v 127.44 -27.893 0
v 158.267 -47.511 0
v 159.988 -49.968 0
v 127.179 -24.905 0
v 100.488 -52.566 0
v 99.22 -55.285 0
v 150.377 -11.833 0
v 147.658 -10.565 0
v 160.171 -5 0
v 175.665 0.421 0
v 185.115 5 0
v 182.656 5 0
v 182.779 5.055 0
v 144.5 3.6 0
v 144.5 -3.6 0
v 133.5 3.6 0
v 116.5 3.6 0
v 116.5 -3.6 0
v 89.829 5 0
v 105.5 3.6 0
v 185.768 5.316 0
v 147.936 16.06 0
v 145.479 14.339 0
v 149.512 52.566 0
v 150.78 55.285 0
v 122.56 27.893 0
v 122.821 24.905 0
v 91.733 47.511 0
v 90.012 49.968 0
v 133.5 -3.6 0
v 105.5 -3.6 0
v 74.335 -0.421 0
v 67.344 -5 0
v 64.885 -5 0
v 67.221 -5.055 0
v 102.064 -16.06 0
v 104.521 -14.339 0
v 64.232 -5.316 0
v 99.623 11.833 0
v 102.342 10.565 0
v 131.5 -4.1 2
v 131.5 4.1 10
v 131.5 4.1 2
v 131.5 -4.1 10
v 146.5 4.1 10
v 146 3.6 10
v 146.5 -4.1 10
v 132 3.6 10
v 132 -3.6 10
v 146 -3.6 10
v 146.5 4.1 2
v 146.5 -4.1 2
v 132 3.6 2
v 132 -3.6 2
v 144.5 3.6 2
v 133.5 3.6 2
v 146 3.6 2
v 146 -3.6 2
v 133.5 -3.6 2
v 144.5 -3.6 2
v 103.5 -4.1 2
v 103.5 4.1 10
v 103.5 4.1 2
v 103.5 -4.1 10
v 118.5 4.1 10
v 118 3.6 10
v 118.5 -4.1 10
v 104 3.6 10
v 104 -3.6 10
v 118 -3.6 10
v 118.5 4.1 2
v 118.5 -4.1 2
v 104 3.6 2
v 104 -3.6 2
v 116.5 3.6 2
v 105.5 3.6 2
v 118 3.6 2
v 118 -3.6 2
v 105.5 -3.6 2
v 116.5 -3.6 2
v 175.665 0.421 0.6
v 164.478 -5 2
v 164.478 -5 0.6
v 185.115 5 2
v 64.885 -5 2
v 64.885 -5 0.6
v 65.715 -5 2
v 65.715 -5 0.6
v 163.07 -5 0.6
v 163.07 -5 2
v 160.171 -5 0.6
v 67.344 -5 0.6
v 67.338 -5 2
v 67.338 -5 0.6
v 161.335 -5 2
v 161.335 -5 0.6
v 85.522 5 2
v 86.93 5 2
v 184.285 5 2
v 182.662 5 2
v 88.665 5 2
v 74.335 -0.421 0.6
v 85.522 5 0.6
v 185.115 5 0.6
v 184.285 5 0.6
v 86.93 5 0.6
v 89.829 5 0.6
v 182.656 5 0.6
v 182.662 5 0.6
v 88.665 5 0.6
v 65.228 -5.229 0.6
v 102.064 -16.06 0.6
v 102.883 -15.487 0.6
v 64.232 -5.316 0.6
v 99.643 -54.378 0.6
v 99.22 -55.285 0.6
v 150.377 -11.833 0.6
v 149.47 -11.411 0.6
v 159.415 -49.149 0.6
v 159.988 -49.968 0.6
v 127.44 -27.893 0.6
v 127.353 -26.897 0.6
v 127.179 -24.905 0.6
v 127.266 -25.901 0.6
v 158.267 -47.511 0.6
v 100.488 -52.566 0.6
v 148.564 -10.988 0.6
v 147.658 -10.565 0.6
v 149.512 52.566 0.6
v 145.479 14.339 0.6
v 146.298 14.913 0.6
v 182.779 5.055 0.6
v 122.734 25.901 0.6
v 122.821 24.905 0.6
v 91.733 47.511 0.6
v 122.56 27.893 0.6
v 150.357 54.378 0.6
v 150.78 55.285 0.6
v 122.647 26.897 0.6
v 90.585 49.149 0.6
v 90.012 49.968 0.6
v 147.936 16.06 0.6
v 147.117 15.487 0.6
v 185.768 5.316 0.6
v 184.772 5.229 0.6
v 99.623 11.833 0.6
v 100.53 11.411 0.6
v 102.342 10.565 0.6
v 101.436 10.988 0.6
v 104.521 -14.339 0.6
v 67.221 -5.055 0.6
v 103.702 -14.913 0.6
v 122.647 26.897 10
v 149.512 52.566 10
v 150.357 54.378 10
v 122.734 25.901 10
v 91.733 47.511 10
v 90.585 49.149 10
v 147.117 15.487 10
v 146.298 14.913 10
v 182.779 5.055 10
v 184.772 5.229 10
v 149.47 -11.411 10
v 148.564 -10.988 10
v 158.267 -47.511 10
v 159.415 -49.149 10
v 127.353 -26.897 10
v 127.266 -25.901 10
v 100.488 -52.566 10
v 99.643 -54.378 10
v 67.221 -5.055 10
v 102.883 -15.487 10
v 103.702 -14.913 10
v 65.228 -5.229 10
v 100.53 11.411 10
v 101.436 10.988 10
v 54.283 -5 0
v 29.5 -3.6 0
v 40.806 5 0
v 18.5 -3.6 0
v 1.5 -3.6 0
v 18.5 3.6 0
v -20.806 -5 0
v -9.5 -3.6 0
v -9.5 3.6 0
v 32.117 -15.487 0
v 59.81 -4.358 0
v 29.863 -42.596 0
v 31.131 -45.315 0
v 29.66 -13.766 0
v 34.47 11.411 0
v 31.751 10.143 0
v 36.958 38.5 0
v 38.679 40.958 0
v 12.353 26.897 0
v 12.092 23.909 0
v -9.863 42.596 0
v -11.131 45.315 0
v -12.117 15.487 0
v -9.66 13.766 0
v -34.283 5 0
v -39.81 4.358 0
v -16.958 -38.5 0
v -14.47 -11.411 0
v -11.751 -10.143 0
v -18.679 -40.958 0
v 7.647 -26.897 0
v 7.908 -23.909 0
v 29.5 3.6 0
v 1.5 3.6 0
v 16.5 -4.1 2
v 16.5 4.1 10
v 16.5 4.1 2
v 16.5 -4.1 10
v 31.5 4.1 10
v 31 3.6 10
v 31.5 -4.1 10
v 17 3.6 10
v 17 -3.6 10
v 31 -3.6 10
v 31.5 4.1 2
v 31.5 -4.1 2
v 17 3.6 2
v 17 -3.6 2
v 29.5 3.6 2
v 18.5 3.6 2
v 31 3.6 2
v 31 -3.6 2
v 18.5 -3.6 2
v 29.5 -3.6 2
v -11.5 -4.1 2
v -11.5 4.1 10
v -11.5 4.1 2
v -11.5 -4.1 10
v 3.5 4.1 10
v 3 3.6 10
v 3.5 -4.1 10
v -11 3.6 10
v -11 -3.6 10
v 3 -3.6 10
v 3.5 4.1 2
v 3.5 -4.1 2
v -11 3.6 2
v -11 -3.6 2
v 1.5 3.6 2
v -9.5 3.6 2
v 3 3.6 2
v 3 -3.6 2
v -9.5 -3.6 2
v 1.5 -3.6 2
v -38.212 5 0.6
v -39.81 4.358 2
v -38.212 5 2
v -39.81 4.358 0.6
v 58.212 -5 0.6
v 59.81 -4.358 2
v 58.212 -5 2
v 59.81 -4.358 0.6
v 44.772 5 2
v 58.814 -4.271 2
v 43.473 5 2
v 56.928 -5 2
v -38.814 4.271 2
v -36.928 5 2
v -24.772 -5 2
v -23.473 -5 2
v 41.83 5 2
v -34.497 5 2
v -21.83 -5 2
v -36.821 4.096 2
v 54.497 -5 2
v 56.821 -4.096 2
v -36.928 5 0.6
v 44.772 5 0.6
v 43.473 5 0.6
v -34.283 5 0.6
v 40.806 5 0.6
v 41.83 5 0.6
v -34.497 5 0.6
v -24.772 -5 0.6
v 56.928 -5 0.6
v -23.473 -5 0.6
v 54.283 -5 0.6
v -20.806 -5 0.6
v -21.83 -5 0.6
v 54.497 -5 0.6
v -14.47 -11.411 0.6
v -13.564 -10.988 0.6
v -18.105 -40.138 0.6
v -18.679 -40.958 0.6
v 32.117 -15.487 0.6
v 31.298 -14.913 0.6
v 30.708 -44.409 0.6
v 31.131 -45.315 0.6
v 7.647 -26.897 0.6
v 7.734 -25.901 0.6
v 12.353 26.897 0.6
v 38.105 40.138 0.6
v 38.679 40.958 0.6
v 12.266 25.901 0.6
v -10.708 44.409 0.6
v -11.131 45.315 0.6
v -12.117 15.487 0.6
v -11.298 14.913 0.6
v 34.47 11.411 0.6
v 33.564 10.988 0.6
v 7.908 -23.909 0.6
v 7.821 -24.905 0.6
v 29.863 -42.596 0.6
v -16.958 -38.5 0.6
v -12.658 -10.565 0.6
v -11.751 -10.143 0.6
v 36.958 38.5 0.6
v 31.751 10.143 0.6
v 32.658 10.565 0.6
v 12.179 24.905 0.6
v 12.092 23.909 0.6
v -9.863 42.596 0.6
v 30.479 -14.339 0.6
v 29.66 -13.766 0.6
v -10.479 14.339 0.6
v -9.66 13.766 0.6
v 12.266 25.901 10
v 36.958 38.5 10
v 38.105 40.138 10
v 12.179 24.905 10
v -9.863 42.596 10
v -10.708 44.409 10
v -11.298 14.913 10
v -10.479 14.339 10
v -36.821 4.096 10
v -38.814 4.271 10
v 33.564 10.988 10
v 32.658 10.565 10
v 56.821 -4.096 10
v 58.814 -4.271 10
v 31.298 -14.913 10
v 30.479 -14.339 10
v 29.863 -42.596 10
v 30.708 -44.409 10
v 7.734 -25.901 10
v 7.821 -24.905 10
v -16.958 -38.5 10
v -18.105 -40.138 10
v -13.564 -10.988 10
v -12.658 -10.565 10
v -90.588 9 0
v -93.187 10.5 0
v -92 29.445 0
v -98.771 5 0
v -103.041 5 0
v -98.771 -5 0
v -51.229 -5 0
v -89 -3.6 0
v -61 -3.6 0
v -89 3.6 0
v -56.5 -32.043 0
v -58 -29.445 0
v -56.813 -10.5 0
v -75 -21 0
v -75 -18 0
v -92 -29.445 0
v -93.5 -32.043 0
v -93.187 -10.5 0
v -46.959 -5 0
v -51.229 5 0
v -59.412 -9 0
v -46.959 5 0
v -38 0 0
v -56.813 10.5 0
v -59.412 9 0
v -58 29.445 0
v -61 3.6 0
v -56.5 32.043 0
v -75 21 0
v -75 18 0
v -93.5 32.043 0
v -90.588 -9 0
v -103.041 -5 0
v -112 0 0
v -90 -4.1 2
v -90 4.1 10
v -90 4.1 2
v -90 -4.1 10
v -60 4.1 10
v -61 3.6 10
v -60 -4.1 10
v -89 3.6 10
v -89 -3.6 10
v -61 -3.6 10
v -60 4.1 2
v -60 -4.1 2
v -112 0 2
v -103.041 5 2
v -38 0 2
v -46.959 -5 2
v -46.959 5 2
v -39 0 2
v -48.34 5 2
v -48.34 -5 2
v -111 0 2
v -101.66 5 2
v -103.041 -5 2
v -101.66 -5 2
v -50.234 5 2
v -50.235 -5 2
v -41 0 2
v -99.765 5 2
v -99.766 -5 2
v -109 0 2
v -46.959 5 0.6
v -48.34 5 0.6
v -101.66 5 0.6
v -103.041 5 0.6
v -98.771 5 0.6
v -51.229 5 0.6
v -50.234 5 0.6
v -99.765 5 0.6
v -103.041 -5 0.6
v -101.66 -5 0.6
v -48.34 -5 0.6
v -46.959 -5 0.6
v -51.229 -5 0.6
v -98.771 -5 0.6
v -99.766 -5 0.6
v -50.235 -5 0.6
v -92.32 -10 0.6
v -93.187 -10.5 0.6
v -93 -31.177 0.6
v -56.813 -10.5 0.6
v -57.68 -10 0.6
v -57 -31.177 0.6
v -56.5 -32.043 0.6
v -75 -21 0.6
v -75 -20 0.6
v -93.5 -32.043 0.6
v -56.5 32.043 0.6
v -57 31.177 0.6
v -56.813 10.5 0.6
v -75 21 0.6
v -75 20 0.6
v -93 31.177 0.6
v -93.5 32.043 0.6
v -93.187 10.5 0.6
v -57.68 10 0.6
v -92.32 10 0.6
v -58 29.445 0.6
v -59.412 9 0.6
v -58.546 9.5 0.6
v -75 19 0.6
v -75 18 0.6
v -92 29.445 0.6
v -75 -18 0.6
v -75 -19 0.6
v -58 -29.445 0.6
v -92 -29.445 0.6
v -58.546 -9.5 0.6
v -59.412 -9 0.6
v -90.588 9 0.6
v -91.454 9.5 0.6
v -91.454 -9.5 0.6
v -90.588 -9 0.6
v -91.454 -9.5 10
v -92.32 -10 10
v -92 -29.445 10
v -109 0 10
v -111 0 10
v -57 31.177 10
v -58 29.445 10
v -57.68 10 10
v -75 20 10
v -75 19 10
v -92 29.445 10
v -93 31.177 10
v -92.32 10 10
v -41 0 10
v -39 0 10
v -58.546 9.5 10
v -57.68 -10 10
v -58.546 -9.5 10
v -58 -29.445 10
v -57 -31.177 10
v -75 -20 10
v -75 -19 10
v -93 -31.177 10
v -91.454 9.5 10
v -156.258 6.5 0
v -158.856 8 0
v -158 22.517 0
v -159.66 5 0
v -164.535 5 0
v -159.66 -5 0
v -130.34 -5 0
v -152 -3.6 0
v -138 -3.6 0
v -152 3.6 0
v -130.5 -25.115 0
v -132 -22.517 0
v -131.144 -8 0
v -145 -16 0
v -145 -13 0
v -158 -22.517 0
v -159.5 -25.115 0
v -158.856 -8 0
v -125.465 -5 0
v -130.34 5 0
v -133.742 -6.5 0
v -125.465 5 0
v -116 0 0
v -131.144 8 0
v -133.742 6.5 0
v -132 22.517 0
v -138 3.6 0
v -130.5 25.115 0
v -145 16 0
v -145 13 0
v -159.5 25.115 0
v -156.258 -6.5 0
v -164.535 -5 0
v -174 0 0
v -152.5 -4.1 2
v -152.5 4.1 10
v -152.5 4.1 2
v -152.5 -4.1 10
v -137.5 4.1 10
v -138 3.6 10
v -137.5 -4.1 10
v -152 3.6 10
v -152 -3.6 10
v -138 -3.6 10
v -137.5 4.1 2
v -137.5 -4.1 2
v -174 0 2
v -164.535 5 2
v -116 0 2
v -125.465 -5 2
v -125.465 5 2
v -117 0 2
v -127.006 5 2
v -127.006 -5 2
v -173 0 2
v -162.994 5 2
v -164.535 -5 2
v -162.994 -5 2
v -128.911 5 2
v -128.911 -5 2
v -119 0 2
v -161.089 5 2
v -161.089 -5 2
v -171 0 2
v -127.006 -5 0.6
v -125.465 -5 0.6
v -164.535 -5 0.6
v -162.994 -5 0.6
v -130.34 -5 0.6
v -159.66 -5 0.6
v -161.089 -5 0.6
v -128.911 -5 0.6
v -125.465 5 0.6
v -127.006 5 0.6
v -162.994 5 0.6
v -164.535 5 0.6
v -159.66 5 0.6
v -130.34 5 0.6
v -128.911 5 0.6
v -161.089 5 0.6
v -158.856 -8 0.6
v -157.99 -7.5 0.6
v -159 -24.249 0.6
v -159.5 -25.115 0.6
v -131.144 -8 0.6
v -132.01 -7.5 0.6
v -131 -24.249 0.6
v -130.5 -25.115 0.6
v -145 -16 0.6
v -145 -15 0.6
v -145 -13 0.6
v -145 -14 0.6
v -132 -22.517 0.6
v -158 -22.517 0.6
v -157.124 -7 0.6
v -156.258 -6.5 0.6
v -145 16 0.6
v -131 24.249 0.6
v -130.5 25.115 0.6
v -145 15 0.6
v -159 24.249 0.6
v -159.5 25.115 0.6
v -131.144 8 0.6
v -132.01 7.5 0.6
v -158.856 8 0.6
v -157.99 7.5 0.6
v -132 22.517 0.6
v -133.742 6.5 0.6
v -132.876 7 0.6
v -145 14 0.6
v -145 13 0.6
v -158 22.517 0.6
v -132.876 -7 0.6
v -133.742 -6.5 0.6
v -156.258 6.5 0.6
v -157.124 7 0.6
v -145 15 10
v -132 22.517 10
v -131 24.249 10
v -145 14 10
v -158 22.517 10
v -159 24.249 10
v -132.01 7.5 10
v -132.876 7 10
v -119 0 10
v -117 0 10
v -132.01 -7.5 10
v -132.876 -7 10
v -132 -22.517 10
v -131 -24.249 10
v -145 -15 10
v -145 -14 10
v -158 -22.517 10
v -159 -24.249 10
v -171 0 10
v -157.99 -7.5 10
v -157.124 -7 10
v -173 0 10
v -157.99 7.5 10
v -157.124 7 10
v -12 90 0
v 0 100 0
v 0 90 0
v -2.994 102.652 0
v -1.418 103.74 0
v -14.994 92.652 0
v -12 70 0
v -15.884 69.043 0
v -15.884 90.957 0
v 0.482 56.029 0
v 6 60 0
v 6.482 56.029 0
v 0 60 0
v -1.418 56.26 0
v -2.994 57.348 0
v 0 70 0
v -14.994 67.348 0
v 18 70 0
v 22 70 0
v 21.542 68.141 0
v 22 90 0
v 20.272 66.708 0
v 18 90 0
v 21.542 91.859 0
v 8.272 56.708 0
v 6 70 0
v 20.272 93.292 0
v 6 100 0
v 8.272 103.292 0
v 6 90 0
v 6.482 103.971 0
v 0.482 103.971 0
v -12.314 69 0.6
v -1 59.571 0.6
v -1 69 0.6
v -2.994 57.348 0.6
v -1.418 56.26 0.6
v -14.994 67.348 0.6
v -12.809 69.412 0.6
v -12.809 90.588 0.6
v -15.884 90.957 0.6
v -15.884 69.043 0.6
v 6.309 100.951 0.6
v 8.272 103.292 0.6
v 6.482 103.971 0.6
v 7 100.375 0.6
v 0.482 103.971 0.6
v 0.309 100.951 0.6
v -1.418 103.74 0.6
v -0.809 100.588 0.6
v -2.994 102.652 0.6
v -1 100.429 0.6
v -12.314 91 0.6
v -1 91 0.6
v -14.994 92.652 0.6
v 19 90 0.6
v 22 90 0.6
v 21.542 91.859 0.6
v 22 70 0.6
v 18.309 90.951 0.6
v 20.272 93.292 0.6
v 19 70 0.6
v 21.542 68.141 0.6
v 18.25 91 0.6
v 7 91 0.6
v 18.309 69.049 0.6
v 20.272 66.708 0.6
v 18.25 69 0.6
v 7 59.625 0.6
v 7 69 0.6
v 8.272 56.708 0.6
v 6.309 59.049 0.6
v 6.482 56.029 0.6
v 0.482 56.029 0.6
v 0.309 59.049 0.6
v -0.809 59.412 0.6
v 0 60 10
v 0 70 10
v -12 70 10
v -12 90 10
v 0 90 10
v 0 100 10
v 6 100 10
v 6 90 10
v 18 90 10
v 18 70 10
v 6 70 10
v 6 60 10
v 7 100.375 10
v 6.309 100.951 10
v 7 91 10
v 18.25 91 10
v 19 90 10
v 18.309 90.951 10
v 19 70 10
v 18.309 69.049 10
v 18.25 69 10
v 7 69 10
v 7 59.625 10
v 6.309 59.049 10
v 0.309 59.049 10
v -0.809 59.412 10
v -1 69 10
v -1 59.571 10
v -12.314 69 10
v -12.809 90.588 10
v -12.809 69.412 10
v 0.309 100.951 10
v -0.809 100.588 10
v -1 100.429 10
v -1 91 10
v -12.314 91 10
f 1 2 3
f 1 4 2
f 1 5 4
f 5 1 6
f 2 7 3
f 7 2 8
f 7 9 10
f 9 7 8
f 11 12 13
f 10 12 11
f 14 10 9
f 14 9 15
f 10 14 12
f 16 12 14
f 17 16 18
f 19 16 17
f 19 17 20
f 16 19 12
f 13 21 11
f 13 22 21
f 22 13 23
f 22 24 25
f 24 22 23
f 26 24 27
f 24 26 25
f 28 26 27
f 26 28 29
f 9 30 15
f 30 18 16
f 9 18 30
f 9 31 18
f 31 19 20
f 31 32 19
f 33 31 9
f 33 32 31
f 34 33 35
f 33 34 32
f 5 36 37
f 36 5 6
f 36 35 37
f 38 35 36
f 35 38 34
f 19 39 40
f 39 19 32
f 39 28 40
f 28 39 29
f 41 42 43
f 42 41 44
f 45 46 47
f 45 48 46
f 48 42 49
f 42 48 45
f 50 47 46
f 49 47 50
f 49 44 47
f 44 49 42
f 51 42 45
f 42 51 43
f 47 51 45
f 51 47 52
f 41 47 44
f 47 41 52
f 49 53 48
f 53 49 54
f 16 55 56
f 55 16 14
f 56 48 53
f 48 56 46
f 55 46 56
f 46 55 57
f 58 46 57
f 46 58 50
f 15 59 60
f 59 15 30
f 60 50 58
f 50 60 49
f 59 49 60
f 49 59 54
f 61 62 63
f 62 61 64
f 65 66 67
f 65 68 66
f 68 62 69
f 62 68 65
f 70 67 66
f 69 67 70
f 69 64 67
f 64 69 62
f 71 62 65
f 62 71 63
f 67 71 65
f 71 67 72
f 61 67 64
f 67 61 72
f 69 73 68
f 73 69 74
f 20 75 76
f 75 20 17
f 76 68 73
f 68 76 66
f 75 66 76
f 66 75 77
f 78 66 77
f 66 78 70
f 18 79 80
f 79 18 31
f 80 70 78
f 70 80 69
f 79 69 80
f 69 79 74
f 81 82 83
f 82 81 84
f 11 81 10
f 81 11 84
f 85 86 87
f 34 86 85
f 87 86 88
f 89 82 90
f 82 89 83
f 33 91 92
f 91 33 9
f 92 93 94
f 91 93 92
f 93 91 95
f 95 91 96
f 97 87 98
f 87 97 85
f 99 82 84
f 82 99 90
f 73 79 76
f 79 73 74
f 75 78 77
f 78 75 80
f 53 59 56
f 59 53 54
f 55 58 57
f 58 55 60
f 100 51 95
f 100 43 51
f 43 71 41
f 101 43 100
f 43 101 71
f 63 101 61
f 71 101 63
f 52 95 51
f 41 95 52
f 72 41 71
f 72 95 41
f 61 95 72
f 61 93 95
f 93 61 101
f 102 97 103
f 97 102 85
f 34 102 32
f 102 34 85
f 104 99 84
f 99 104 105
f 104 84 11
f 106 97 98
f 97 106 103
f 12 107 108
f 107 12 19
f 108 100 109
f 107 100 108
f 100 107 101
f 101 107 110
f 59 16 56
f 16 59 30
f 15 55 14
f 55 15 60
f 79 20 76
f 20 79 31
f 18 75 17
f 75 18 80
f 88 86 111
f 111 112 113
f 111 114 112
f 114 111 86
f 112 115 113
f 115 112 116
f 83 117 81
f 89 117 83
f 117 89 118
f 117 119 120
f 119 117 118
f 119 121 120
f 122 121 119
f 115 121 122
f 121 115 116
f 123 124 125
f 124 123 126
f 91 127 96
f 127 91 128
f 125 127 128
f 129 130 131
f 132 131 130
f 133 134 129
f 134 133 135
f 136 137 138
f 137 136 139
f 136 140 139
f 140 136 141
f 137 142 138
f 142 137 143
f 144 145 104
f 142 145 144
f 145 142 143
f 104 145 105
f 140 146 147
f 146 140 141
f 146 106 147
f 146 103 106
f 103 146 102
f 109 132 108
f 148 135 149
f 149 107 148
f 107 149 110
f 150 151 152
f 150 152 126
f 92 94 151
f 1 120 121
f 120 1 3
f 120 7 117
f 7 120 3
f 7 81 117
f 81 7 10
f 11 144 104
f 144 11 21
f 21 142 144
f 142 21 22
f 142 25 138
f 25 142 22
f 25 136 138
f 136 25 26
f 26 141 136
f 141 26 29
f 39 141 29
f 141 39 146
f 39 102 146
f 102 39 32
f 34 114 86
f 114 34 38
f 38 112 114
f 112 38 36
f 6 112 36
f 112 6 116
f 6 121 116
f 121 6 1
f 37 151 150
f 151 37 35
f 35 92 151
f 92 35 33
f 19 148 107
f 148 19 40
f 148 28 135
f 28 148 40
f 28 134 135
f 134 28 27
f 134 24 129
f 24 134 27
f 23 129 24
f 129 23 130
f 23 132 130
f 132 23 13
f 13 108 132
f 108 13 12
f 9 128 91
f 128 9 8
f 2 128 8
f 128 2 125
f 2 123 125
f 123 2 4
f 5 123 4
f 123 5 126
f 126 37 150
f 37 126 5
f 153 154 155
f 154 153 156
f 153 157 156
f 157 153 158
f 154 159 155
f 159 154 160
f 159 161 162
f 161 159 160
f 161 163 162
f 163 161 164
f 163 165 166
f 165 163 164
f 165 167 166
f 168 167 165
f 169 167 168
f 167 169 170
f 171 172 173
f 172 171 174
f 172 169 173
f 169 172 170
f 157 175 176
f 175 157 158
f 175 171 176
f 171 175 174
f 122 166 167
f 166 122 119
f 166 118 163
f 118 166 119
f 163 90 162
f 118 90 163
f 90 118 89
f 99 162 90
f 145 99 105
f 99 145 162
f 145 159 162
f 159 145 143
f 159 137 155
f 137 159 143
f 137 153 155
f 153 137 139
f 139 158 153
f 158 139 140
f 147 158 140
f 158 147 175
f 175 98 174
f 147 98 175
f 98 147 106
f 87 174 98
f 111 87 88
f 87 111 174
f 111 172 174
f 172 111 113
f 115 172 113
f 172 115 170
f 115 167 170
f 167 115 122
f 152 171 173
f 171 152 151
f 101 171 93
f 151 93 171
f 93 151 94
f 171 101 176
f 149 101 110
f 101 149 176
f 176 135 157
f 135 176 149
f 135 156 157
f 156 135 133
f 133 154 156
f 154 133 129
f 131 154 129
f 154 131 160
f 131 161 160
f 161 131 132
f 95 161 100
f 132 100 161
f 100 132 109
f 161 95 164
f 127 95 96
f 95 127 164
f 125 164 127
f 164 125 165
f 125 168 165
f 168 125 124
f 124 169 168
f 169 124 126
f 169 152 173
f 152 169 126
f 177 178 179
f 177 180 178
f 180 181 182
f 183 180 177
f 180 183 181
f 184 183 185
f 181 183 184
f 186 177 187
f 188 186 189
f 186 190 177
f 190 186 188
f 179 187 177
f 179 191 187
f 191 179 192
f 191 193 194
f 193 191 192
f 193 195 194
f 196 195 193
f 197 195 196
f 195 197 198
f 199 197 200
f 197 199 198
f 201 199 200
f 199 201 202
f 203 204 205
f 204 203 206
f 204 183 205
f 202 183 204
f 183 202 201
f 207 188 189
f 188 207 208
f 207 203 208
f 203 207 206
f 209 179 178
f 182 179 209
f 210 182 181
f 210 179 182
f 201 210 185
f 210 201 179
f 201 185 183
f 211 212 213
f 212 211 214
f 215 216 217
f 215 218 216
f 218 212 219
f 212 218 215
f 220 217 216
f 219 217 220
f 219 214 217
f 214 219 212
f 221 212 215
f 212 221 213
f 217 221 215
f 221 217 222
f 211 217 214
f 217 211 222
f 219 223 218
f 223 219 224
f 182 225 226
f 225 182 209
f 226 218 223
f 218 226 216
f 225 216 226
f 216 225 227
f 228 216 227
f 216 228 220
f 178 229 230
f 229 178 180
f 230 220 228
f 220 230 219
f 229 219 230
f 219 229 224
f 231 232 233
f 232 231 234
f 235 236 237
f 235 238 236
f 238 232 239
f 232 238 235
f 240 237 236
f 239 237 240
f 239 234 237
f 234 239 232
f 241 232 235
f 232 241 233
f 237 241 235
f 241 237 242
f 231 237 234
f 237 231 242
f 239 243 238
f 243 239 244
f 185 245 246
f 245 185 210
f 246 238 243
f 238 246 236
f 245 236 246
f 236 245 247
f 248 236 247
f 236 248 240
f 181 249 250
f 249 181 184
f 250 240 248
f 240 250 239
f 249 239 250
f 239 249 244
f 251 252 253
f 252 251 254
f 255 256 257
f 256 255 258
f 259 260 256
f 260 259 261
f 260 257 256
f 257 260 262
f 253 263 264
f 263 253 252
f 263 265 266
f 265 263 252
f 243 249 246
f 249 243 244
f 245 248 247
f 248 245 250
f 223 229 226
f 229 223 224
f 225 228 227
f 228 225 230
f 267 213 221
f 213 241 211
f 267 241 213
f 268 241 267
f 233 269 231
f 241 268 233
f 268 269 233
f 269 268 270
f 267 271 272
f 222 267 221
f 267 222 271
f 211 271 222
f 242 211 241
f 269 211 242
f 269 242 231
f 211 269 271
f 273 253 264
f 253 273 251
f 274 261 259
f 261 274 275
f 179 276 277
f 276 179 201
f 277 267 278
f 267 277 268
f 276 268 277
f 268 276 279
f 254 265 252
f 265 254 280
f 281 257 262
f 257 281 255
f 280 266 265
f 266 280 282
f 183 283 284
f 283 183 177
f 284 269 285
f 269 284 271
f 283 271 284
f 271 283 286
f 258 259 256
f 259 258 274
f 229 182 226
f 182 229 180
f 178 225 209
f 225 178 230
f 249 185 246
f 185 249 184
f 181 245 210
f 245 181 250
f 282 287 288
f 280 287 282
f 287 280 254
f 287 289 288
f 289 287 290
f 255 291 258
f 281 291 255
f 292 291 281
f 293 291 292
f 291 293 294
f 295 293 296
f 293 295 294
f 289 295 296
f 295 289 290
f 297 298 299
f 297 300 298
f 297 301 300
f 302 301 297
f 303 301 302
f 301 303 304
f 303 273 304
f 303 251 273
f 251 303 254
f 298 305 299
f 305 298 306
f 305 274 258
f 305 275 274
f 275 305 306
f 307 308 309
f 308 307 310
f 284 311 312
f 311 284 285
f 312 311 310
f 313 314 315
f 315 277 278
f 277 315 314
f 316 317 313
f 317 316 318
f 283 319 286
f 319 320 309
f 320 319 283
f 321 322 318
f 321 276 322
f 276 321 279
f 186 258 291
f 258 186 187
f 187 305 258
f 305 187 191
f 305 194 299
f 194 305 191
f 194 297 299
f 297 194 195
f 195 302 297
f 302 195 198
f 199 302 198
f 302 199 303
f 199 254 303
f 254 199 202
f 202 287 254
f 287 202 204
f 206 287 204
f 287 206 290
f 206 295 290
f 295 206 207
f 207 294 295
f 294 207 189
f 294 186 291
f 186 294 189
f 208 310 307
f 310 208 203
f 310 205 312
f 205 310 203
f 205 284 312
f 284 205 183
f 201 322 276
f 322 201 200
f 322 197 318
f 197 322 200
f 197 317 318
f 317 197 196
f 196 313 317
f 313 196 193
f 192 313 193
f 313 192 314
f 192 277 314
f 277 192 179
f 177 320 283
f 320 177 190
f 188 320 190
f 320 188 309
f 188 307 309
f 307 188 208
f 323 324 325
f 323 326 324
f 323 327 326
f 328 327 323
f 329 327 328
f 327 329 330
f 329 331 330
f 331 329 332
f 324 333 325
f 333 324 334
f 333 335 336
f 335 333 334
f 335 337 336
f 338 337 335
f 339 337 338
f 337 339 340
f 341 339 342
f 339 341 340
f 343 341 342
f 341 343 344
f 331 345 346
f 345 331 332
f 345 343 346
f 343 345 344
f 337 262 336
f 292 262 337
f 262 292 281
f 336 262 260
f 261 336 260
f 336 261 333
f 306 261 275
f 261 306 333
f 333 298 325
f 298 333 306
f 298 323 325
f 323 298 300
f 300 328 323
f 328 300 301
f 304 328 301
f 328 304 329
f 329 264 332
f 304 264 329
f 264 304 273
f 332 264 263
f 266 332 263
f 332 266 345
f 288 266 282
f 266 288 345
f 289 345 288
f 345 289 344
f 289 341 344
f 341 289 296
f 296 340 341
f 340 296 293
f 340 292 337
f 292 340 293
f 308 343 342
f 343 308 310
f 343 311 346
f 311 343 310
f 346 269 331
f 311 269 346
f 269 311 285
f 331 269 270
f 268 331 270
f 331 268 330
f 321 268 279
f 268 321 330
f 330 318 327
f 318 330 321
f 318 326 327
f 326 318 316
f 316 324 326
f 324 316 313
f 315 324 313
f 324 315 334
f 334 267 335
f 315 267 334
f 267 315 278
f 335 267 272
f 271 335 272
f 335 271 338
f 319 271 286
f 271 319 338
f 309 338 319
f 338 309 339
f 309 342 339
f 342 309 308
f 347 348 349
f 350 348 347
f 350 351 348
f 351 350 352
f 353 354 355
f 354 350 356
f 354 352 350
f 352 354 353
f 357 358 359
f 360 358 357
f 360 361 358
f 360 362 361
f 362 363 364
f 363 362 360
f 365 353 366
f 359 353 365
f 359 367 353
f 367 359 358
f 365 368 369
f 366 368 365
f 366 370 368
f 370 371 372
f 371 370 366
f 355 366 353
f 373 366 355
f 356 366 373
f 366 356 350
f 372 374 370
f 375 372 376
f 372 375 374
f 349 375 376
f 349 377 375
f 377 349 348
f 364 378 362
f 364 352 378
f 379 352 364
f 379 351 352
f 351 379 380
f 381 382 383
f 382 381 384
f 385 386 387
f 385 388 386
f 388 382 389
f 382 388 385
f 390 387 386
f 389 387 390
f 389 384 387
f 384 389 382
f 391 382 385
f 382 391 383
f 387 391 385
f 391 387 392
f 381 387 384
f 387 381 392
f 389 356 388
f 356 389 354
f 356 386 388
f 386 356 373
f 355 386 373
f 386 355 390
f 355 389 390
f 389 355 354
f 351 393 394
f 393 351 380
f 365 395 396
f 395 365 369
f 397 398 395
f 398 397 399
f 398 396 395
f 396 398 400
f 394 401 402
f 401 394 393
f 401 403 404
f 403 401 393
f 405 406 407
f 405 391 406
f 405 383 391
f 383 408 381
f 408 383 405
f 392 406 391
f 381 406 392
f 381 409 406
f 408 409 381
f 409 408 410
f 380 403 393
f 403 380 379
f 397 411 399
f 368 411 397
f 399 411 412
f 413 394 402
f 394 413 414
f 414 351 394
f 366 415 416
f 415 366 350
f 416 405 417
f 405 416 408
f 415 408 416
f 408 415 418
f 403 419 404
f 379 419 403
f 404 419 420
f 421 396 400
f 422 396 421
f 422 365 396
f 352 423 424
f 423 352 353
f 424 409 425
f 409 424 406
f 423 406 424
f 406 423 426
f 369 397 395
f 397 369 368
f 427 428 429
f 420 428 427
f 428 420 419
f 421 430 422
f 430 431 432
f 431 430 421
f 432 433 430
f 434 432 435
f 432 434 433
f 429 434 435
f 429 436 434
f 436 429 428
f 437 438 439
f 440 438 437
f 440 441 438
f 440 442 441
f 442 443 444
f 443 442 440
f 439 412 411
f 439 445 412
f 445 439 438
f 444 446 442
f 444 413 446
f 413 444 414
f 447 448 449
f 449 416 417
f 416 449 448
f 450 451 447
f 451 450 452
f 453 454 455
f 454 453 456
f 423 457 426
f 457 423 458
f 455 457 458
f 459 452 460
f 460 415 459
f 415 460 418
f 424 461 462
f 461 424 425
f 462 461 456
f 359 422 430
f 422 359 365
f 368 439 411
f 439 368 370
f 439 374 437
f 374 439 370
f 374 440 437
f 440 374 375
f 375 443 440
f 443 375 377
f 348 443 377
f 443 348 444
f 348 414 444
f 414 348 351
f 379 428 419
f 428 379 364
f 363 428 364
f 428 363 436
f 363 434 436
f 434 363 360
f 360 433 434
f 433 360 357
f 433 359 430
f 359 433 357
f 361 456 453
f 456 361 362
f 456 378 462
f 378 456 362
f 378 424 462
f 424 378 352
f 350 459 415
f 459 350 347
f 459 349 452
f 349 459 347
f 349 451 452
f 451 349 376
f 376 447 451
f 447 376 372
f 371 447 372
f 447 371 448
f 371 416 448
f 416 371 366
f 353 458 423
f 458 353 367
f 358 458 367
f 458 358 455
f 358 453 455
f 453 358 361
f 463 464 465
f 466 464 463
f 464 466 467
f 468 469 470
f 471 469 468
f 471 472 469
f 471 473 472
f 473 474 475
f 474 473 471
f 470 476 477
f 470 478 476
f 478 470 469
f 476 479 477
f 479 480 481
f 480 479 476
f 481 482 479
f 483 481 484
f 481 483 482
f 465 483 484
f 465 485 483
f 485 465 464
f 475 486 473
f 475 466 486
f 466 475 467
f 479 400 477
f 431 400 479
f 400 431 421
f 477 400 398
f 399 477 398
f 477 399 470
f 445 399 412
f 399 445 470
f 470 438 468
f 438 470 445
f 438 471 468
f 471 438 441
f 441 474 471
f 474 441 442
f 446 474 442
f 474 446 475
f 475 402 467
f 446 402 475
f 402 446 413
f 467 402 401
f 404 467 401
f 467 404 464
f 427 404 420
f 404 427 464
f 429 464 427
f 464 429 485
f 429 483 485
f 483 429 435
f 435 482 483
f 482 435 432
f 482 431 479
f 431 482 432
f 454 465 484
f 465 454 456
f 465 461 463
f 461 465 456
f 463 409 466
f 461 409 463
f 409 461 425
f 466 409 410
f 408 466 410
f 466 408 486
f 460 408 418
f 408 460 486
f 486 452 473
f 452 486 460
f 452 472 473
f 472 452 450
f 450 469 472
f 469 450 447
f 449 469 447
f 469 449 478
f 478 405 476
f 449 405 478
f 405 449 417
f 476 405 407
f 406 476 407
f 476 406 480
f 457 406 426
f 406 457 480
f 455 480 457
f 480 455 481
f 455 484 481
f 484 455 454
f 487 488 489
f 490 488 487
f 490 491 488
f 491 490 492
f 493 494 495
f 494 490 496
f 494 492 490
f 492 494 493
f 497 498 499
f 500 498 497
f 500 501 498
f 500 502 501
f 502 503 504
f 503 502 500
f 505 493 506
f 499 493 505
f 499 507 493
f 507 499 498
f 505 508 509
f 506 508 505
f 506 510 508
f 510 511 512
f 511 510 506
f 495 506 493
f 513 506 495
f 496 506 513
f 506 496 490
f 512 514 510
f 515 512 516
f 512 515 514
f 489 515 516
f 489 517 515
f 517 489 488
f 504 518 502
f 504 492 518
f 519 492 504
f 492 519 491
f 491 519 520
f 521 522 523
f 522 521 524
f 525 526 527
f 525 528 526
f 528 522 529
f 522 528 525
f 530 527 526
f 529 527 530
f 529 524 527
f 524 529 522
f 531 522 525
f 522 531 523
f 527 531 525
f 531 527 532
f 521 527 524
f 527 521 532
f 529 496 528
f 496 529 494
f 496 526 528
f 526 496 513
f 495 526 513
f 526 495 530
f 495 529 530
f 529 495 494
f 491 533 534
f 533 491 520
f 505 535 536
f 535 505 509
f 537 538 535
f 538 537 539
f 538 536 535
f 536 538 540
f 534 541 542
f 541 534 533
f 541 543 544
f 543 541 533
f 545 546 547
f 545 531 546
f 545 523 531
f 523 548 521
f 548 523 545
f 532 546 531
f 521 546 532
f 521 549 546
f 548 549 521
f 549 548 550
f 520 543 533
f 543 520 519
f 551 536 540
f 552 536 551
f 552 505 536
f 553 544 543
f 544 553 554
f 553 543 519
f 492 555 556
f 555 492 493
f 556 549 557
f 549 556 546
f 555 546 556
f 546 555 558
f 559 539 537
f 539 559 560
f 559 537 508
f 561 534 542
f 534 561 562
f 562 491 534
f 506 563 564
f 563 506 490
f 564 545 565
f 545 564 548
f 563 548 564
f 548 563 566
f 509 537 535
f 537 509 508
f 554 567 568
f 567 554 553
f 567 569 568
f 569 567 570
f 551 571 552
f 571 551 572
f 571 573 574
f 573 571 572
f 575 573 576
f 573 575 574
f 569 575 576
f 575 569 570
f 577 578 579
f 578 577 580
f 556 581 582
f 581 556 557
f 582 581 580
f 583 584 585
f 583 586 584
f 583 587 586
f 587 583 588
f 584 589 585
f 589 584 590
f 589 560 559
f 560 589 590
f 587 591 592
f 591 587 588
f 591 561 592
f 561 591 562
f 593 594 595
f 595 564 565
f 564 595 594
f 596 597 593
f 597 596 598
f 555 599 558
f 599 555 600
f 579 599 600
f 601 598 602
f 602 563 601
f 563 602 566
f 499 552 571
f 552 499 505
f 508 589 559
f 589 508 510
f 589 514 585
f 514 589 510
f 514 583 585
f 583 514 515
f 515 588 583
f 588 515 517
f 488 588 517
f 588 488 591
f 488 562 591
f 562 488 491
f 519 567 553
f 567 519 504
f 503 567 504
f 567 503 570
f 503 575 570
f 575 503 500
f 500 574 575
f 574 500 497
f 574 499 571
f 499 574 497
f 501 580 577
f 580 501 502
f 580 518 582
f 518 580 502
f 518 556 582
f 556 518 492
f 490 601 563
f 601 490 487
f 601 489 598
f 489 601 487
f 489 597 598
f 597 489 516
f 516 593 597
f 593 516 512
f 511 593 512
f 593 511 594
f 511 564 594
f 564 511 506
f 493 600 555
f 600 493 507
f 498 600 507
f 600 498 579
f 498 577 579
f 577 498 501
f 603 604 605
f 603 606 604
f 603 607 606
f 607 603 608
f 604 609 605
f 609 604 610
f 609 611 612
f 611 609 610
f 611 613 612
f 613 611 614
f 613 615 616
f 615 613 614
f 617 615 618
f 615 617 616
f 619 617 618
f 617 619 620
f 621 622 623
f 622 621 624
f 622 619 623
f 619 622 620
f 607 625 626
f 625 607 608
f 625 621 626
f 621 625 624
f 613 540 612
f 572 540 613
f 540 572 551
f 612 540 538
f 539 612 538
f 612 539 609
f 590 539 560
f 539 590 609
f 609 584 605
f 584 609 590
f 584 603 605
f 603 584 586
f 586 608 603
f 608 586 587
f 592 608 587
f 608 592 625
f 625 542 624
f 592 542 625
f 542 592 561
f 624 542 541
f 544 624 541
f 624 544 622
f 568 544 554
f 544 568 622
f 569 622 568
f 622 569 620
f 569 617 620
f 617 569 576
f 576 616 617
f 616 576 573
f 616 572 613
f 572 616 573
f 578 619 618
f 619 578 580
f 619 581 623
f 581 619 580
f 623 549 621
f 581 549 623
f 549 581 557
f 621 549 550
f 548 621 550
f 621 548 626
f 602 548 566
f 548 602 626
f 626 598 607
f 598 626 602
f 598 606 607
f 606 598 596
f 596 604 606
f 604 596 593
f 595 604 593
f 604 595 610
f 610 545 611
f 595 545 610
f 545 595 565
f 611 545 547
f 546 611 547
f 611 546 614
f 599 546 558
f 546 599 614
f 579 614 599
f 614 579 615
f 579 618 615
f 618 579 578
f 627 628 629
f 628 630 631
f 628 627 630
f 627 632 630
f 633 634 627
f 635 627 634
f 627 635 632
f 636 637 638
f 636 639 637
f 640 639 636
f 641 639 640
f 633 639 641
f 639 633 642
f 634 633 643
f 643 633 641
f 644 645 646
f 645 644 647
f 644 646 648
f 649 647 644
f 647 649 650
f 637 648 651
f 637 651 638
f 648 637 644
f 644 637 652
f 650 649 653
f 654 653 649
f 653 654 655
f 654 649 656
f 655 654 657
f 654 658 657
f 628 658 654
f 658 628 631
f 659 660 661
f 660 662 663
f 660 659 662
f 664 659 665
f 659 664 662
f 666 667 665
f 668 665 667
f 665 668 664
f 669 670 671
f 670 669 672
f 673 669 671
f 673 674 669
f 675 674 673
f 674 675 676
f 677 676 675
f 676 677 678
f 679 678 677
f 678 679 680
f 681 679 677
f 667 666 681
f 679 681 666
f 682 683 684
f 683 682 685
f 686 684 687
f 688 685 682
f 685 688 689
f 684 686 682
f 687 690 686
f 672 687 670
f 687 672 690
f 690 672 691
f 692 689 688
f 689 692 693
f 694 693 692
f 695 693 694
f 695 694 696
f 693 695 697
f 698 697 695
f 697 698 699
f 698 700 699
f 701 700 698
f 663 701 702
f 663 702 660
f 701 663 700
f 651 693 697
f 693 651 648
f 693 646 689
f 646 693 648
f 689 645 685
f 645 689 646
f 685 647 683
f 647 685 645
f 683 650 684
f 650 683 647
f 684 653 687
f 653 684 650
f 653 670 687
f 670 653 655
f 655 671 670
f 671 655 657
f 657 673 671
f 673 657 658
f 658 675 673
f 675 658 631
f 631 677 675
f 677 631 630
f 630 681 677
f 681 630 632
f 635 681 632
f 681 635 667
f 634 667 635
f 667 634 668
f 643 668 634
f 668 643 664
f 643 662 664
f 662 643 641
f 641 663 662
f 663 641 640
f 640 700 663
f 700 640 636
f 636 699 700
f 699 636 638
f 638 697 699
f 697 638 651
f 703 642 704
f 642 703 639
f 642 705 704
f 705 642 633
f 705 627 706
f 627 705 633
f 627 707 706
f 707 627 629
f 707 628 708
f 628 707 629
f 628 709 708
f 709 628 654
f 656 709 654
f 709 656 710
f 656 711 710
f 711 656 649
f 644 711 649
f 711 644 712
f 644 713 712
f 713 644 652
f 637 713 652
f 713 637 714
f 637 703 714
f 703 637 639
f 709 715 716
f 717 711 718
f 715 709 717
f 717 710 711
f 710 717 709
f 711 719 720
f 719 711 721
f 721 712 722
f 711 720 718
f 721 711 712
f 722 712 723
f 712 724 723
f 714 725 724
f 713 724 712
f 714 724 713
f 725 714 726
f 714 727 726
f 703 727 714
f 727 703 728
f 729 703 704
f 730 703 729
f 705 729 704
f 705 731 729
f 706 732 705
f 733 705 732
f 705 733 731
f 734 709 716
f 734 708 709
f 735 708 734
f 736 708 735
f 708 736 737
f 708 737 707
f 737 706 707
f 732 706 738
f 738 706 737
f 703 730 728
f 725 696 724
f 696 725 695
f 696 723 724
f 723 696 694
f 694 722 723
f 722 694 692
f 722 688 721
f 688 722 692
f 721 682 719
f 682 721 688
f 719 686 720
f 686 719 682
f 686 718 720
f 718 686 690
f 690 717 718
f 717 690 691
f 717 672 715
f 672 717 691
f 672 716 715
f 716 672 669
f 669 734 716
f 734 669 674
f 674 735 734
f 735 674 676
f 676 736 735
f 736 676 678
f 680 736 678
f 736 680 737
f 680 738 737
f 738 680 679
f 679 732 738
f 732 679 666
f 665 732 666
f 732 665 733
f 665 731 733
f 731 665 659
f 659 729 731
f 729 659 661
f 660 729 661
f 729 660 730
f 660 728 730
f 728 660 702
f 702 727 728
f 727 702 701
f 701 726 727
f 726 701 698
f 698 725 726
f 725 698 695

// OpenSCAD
fn=6;


// create 2d vector shape: circle
function circv(r=1,fn=32)=
[for(i=[0:fn-1])
[r*cos(360*i/fn),r*sin(360*i/fn)]
];

// create 2d vector shape: star
function starv(r1=1,r2=2,fn=32)=
[for(i=[0:(2*fn-1)])
(i%2==0)?
[r1*cos(180*i/fn),r1*sin(180*i/fn)]:
[r2*cos(180*i/fn),r2*sin(180*i/fn)]
];


// display a 2d vector shape
module dispv(v){
indi=[[for(i=[0:len(v)-1])i]];
polygon(points=v,paths=indi);
}
ep=10;
// etoile(nbdepointe,dia intérieur,diaextérieur,epaisseur,angle,decalageentretoiseN-1,0si dernierétage
translate([125,0,0])etoile(6,27,60,ep,35,14,1);
translate([10,0,0])etoile(6,26,49,ep,25,14,1);
translate([-75,0,0])etoile(6,20,36,ep,30,7,2);
translate([-145,0,0])etoile(6,15,28,ep,30,7,0);
translate([ 0,60,000])entretoise(ep);

module entretoise(epais)
{
e=10; //epaisseur de pate
h=20; //ecart entre les plateaux
l=6; //largeur du tenon
a=12; //largeur des aillettes
cercle1=4;
linear_extrude(.6)
difference(){
    hull() {
        translate([0,0]) circle(cercle1);
        translate([0,e]) circle(cercle1);
        translate([-a,e]) circle(cercle1);
        translate([-a,e+h]) circle(cercle1);
        translate([0,e+h]) circle(cercle1);
        translate([0,e+h+e]) circle(cercle1);
        translate([l,e+h+e]) circle(cercle1);
        translate([l,e+h]) circle(cercle1);
        translate([l+a,e+h]) circle(cercle1);
        translate([l+a,e]) circle(cercle1);
        translate([l,e]) circle(cercle1);
        translate([l,0]) circle(cercle1);
    }
polygon([[0,0],[0,e],[-a,e],
    [-a,e+h],[0,e+h],[0,e+h+e],[l,e+h+e],[l,e+h],
    [l+a,e+h],[l+a,e],[l,e],[l,0]]);
}

cercle=1;
linear_extrude(epais)
difference(){
    hull() {
        translate([0,0]) circle(cercle);
        translate([0,e]) circle(cercle);
        translate([-a,e]) circle(cercle);
        translate([-a,e+h]) circle(cercle);
        translate([0,e+h]) circle(cercle);
        translate([0,e+h+e]) circle(cercle);
        translate([l,e+h+e]) circle(cercle);
        translate([l,e+h]) circle(cercle);
        translate([l+a,e+h]) circle(cercle);
        translate([l+a,e]) circle(cercle);
        translate([l,e]) circle(cercle);
        translate([l,0]) circle(cercle);
    }
polygon([[0,0],[0,e],[-a,e],
    [-a,e+h],[0,e+h],[0,e+h+e],[l,e+h+e],[l,e+h],
    [l+a,e+h],[l+a,e],[l,e],[l,0]]);
polygon([[-1,-1],   [-1,e-1],    [-a-1,e-1],[-a-1,-1]]);
polygon([[-1,e+h+1],[-1,e+h+e+1],[-a-1,e+h+e+1],[-a-1,e+h+1]]);
polygon([[l+1,-1],   [l+1,e-1],    [l+a+1,e-1],[l+a+1,-1]]);
polygon([[l+1,e+h+1],[l+1,e+h+e+1],[l+a+1,e+h+e+1],[l+a+1,e+h+1]]);
}

}


module etoile(nb,et1,et2,epais,ang,dec1,dec2)
{
//etoile et decoupe
et11=starv(et1,et2,nb);
et12=starv(et1-1,et2-2,nb);
et21=starv(et1+1,et2+1,nb);
et22=starv(et1-2,et2-2,nb);

linear_extrude(.6)
    difference(){
//v0=starv(et1+1,et2+1,nb);
rotate([0,0,ang])translate([00,0,0])dispv(et21);

//v0=starv(et1-2,et2-2,fn);
rotate([0,0,ang])translate([00,0,0])dispv(et22);
}

linear_extrude(epais)
    difference(){
//v0=starv(et1,et2,nb);
rotate([0,0,ang])translate([00,0,0])dispv(et11);

//v0=starv(et1-2,et2-2,fn);
rotate([0,0,ang])translate([00,0,0])dispv(et12);
}




if (dec2==1){
difference(){
linear_extrude(epais)translate([dec1,0,0])square([15,8.2],center=true);
linear_extrude(epais)translate([dec1,0,0])square([14,7.2],center=true);
}
difference(){
linear_extrude(epais)translate([-dec1,0,0])square([15,8.2],center=true);
linear_extrude(epais)translate([-dec1,0,0])square([14,7.2],center=true);
}
}

if (dec2==1){
difference(){
linear_extrude(2)difference(){
rotate([0,0,ang])translate([00,0,0])dispv(et21);
translate([0,200/2+5,0])square([200,200],center=true);
translate([0,-200/2-5,0])square([200,200],center=true);
}
linear_extrude(2)translate([dec1,0,0])square([11,8.2],center=true);
linear_extrude(2)translate([-dec1,0,0])square([11,8.2],center=true);
}
}

if (dec2==2){
difference(){
linear_extrude(epais)translate([0,0,0])square([15*2,8.2],center=true);
linear_extrude(epais)translate([0,0,0])square([14*2,7.2],center=true);
}
}

if (dec2==2){
difference(){
linear_extrude(2)difference(){
rotate([0,0,ang])translate([00,0,0])dispv(et21);
translate([0,200/2+5,0])square([200,200],center=true);
translate([0,-200/2-5,0])square([200,200],center=true);
}
linear_extrude(2)translate([0,0,0])square([15*2,8.2],center=true);
}
}

if (dec2==0){
difference(){
linear_extrude(epais)translate([0,0,0])square([15,8.2],center=true);
linear_extrude(epais)translate([0,0,0])square([14,7.2],center=true);
}
}

if (dec2==0){
difference(){
    linear_extrude(2)
difference(){
rotate([0,0,ang])dispv(et21);
translate([0,100/2+5,0])square([100,100],center=true);
translate([0,-100/2-5,0])square([100,100],center=true);
}
linear_extrude(2)square([15,8.2],center=true);
}
}
}
